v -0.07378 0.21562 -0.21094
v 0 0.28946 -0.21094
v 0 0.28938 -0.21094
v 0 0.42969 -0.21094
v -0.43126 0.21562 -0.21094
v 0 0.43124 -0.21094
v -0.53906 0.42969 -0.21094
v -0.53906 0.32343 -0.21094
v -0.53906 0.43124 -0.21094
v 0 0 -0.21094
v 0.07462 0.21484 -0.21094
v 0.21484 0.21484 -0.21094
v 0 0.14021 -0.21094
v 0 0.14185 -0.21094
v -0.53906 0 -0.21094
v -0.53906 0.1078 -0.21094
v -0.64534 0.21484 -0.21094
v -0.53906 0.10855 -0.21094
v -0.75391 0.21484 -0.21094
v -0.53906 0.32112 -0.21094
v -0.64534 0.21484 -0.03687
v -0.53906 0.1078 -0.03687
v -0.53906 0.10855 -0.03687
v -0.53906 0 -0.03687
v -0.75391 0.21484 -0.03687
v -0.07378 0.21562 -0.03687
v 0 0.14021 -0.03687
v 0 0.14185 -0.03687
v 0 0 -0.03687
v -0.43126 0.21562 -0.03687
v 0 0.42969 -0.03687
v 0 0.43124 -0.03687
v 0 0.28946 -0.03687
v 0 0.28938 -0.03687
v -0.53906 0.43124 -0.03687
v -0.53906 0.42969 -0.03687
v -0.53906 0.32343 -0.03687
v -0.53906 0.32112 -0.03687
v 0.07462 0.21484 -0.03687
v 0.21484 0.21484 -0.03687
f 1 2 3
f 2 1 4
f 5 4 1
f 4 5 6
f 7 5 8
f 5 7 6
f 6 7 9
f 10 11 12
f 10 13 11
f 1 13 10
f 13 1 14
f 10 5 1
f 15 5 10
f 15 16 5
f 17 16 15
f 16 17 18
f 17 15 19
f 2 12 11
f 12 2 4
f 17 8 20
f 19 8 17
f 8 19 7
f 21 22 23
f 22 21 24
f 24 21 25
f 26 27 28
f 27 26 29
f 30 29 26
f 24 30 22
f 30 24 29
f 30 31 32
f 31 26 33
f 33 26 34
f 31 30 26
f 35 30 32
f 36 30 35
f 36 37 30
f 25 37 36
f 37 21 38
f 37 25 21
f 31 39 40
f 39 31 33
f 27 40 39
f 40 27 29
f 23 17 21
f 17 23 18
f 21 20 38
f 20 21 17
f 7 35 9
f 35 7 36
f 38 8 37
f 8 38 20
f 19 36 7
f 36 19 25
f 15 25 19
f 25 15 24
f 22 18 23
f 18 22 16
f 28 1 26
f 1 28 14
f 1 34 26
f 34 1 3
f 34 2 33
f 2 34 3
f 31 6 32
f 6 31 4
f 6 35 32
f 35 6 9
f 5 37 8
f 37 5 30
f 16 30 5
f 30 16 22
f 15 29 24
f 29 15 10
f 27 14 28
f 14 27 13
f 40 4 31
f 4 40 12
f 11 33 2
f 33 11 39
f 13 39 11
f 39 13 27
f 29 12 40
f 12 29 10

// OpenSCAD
EPS = 0.01;

module sketch0() {
    translate([-0.5390625, 0, -0.2109375])
    linear_extrude(height=0.1640625 + EPS)
    polygon(points=[
        [0.0, 0.10855263157894737],
        [-0.10629111842105264, 0.21484375],
        [0.0, 0.32113486842105265],
        [0.0, 0.4296875],
        [-0.21484375, 0.21484375],
        [0.0, 0.0]
    ]);
}

module sketch1() {
    translate([-0.5390625, 0, -0.2109375])
    linear_extrude(height=0.1640625 + EPS)
    polygon(points=[
        [0.5390625, 0.0],
        [0.5390625, 0.14185855263157895],
        [0.46529605263157897, 0.215625],
        [0.5390625, 0.28939144736842104],
        [0.5390625, 0.43125],
        [0.0, 0.43125],
        [0.0, 0.32343750000000004],
        [0.1078125, 0.215625],
        [0.0, 0.1078125],
        [0.0, 0.0]
    ]);
}

module sketch2() {
    translate([0, 0, -0.2109375])
    linear_extrude(height=0.1640625 + EPS)
    polygon(points=[
        [0.0, 0.0],
        [0.21484375, 0.21484375],
        [0.0, 0.4296875],
        [0.0, 0.2894736842105263],
        [0.07462993421052631, 0.21484375],
        [0.0, 0.1402138157894737],
        [0.0, 0.0]
    ]);
}

union() {
    sketch0();
    sketch1();
    sketch2();
}
